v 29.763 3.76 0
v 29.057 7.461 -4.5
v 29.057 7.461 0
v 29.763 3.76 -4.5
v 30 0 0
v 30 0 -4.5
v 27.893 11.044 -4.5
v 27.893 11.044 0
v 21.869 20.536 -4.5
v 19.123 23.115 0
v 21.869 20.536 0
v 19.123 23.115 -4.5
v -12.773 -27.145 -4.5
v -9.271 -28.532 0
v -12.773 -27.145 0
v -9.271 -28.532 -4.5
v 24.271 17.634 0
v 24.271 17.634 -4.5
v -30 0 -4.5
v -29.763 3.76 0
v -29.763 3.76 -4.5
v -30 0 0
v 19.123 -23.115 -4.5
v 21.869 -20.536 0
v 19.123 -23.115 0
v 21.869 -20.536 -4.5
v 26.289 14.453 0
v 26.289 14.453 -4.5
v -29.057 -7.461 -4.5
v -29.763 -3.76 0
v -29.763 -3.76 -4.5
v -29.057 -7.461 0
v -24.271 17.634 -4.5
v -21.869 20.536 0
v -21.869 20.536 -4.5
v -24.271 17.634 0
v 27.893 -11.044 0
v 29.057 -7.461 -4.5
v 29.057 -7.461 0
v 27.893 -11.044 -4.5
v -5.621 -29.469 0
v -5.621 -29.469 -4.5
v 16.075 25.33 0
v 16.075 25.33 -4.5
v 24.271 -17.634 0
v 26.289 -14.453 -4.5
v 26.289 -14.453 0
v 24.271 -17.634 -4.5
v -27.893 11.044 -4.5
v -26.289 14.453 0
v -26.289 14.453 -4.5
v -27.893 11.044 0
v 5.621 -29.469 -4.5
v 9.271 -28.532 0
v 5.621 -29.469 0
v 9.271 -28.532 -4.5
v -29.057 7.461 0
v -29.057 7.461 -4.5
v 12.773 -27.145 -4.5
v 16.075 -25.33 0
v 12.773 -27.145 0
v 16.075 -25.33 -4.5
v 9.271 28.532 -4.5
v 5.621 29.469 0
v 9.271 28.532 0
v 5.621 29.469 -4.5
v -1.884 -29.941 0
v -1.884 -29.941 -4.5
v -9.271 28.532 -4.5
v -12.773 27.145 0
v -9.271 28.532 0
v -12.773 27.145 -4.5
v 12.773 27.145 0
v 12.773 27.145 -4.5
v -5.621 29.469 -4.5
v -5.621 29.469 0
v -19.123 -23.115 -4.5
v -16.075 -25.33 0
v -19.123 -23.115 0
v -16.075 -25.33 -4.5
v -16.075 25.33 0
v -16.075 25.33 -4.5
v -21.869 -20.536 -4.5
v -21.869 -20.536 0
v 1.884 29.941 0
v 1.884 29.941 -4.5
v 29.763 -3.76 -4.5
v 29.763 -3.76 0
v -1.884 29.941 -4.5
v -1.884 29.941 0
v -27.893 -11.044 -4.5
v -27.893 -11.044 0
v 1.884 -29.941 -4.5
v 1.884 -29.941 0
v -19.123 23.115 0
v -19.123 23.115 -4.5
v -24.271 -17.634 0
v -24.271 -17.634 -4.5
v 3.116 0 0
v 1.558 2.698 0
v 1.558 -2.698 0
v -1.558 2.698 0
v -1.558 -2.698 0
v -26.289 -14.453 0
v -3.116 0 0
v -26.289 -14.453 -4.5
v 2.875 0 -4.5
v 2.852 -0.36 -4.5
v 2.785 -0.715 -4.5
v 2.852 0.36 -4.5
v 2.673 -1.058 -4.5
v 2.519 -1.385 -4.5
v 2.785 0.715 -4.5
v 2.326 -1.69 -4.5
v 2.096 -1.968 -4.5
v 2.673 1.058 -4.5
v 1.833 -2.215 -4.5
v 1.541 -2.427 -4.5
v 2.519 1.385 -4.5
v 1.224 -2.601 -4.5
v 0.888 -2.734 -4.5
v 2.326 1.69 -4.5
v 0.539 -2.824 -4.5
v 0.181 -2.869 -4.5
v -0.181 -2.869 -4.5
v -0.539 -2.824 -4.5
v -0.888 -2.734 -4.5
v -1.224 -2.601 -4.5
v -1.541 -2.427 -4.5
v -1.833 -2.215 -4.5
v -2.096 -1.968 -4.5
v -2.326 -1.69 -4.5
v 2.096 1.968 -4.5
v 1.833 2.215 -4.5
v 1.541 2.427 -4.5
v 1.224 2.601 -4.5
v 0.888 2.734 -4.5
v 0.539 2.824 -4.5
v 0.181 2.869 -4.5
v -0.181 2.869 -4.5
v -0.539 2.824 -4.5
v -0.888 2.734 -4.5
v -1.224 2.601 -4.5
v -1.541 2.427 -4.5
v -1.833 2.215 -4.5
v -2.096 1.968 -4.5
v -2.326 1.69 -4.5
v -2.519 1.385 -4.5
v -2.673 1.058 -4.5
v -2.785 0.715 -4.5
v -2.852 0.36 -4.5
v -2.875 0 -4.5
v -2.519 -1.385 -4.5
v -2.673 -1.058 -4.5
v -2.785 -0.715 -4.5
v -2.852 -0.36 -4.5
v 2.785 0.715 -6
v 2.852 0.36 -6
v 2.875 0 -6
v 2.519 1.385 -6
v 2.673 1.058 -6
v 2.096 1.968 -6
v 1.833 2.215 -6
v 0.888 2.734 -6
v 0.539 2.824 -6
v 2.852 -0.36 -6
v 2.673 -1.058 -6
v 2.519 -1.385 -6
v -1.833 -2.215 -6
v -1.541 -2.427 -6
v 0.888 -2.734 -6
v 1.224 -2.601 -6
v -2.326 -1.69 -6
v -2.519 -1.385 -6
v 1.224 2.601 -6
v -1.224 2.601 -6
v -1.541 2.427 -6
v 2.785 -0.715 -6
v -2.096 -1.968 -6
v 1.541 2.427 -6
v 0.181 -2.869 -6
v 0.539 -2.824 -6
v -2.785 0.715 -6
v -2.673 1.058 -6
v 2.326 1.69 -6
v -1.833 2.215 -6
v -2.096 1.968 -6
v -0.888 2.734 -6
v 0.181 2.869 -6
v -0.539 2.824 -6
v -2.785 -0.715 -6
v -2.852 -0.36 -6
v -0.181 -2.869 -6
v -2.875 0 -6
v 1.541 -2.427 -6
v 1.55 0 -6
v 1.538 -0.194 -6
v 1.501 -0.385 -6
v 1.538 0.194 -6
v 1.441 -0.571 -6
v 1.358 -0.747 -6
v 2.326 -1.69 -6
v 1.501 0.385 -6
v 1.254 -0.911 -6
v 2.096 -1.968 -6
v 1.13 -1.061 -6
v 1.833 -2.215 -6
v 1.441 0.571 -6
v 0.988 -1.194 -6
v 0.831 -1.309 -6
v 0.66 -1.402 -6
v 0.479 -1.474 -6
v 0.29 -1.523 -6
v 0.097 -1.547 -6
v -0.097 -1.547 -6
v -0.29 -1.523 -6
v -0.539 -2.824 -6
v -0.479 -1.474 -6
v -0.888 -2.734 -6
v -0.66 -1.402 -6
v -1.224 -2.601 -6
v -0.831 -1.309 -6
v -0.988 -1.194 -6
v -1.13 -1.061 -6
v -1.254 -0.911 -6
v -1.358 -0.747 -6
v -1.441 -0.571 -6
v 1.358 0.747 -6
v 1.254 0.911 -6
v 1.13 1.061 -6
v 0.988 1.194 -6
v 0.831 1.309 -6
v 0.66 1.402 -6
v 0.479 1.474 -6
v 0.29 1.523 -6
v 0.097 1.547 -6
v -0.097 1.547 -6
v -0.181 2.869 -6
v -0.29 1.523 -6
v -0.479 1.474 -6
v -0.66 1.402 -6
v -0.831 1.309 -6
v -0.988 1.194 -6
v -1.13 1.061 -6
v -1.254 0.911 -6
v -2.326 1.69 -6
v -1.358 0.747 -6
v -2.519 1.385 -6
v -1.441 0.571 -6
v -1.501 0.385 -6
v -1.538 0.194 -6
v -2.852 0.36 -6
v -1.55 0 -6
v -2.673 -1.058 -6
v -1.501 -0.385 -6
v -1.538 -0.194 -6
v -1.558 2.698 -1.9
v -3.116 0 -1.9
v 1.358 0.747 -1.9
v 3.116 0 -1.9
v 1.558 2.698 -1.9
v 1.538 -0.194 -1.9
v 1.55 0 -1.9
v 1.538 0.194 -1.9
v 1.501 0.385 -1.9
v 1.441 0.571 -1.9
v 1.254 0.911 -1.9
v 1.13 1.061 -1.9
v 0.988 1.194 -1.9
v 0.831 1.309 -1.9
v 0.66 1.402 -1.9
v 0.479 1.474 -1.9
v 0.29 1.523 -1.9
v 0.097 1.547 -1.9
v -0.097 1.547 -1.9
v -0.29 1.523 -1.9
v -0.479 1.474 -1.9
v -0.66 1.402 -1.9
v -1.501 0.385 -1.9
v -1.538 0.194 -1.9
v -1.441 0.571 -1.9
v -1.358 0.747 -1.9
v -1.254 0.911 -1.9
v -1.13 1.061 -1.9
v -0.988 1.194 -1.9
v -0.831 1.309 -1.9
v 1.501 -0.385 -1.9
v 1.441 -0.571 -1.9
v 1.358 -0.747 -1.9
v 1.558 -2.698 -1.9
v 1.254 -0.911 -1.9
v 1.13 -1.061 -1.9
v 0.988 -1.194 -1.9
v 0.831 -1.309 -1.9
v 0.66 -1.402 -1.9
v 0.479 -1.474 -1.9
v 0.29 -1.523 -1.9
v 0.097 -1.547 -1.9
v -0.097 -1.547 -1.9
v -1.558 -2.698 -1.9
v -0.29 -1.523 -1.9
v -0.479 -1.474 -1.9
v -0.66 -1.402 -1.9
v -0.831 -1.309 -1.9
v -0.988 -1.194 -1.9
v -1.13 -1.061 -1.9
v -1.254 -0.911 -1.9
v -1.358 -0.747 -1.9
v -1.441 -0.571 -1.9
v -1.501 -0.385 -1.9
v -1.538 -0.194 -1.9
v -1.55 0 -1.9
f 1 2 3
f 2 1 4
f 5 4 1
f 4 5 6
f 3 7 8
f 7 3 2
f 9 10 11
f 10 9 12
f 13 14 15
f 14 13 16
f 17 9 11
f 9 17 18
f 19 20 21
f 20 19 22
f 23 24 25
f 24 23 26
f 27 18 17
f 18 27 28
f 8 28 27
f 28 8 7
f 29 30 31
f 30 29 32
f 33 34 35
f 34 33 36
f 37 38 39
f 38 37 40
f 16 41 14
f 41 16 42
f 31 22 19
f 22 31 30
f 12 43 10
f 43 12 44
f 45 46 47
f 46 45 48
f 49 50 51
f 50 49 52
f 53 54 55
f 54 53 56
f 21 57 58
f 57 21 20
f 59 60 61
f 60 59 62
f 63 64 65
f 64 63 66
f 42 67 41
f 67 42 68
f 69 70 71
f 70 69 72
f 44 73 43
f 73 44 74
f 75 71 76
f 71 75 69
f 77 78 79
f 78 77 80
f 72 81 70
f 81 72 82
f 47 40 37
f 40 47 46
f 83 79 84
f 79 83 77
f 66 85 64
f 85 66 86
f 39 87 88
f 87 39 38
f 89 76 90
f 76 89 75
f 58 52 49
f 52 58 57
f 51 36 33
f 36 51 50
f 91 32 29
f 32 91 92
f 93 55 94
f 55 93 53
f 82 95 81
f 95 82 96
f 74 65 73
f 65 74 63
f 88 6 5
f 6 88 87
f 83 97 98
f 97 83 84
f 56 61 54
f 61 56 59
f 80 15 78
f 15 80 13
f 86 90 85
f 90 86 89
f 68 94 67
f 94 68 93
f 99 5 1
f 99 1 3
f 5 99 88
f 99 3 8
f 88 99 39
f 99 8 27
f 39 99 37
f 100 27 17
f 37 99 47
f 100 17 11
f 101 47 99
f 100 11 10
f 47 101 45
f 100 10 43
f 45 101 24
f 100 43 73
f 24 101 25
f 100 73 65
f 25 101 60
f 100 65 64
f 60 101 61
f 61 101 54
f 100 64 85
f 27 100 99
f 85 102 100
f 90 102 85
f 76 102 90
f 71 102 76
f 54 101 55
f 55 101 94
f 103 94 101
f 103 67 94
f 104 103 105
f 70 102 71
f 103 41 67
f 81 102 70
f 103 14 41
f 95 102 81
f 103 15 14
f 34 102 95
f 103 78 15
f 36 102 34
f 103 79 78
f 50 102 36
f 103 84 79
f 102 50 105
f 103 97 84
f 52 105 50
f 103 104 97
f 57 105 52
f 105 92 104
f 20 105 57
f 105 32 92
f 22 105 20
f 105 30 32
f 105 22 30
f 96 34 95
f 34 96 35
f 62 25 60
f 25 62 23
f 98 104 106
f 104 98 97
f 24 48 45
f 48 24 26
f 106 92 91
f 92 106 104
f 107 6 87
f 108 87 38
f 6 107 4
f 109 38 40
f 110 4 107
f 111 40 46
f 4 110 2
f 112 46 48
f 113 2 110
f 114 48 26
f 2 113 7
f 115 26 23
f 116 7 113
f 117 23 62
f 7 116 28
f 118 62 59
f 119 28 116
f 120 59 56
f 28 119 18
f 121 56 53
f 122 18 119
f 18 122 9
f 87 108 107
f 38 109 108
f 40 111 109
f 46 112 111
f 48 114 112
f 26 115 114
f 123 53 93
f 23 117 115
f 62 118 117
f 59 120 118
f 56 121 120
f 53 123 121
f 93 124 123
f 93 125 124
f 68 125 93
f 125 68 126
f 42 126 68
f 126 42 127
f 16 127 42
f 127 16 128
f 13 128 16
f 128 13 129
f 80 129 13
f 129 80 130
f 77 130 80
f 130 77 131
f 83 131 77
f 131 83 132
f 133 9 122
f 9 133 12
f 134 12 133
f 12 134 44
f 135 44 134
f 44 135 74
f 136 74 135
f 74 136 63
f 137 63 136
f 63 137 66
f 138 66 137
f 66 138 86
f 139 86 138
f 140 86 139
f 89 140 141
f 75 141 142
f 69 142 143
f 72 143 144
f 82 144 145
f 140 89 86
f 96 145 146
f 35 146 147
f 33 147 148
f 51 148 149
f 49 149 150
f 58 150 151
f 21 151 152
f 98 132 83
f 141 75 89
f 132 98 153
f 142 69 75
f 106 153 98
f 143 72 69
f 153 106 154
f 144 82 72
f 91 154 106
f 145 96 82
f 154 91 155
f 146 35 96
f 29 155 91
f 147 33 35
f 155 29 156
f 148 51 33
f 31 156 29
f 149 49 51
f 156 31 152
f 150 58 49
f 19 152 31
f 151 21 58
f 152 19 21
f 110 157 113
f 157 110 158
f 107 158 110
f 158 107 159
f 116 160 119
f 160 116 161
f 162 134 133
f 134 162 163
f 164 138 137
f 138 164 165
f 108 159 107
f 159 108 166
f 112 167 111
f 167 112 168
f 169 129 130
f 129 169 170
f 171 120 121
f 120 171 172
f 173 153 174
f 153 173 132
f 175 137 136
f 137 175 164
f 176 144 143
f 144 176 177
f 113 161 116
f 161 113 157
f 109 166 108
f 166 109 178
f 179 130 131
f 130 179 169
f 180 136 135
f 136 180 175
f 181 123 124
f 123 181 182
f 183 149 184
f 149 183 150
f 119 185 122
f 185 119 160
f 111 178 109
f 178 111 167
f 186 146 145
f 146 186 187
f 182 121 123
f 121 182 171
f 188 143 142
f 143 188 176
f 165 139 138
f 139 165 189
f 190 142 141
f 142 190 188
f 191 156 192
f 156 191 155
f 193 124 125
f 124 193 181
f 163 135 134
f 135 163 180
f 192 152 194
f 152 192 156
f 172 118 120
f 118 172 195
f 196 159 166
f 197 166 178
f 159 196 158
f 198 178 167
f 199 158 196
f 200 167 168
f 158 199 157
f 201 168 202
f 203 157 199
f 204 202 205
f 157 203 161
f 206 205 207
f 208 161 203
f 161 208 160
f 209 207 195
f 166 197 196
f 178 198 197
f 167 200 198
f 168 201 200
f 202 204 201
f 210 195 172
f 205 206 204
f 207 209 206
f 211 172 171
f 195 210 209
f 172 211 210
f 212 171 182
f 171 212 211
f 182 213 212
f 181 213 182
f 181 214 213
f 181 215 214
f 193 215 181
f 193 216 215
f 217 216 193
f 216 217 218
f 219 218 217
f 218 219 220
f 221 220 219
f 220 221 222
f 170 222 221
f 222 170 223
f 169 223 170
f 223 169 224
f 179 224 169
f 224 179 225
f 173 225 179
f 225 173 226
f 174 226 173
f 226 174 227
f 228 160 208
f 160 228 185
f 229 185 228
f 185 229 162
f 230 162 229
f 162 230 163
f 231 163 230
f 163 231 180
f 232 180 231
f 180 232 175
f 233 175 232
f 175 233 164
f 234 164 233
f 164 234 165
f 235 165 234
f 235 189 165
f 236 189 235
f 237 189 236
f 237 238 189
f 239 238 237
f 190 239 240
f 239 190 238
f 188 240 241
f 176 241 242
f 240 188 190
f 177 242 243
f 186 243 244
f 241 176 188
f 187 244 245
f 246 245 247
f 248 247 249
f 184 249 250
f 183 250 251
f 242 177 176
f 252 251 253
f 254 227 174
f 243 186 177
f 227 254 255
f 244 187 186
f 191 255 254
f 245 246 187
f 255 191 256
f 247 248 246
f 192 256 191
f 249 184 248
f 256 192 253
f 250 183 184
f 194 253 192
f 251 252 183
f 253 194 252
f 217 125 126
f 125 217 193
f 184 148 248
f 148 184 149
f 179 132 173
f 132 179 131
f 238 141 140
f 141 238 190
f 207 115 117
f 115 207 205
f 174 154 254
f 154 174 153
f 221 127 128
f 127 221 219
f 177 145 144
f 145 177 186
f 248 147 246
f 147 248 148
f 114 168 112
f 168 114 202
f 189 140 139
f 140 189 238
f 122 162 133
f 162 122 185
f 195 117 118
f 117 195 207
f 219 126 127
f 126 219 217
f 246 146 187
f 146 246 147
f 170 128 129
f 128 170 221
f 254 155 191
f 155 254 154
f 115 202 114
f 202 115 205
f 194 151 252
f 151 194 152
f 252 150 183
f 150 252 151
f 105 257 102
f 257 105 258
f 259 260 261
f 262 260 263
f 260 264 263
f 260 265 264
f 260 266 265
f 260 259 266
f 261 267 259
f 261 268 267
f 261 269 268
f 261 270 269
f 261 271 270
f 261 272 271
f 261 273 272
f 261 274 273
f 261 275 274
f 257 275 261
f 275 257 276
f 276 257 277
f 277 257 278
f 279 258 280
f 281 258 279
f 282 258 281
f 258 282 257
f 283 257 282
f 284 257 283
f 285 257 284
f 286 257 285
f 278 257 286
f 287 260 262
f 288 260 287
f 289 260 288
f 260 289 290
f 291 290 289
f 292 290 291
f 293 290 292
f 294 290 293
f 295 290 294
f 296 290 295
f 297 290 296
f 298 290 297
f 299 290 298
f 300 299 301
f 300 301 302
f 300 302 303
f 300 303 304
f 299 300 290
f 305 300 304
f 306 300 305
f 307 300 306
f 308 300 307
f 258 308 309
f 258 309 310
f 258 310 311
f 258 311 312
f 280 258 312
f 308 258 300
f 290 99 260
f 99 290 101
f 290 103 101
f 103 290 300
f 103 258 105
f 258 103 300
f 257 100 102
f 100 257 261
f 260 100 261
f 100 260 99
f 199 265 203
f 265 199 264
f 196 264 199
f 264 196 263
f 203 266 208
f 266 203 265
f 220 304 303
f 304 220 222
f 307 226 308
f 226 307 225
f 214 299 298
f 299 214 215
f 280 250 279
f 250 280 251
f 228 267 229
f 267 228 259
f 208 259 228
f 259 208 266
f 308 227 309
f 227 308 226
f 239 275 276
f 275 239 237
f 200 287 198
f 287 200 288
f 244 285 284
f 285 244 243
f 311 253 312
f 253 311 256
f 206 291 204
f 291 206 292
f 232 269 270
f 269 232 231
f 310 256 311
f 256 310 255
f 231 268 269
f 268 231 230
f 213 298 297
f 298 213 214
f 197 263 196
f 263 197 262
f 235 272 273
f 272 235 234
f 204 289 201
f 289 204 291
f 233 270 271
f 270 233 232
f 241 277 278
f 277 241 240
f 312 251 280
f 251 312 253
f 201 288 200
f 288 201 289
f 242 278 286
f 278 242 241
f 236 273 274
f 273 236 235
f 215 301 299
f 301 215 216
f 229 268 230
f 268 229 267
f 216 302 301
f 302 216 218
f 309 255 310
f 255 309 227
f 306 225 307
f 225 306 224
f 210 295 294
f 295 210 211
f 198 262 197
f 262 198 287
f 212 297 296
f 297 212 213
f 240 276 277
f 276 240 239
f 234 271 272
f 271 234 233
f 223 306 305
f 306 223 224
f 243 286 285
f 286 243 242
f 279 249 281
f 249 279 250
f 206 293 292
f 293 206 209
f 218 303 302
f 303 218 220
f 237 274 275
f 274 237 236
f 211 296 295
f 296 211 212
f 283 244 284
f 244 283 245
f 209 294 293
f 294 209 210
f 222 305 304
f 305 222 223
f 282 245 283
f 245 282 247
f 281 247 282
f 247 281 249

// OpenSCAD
$fn = 50;

difference() {
	union() {
		translate(v = [0, 0, -4.5]) {
			cylinder(h = 4.5, r = 30.0);
		}
		#translate(v = [0, 0, -6.0]) {
			cylinder(h = 6, r = 2.875);
		}
	}
	union() {
		translate(v = [0, 0, 0]) {
			rotate(a = [0, 0, 0]) {
				difference() {
					union() {
						translate(v = [0, 0, -1.9]) {
							linear_extrude(height = 1.9) {
								polygon(points = [[3.1158, 0.0], [1.5579000000000005, 2.698361953111554], [-1.5578999999999994, 2.6983619531115544], [-3.1158, 3.815754496783323e-16], [-1.5579000000000014, -2.6983619531115535], [1.557899999999998, -2.6983619531115552]]);
							}
						}
					}
					union();
				}
			}
		}
		#translate(v = [0, 0, -100.0]) {
			cylinder(h = 200, r = 1.55);
		}
	}
}
